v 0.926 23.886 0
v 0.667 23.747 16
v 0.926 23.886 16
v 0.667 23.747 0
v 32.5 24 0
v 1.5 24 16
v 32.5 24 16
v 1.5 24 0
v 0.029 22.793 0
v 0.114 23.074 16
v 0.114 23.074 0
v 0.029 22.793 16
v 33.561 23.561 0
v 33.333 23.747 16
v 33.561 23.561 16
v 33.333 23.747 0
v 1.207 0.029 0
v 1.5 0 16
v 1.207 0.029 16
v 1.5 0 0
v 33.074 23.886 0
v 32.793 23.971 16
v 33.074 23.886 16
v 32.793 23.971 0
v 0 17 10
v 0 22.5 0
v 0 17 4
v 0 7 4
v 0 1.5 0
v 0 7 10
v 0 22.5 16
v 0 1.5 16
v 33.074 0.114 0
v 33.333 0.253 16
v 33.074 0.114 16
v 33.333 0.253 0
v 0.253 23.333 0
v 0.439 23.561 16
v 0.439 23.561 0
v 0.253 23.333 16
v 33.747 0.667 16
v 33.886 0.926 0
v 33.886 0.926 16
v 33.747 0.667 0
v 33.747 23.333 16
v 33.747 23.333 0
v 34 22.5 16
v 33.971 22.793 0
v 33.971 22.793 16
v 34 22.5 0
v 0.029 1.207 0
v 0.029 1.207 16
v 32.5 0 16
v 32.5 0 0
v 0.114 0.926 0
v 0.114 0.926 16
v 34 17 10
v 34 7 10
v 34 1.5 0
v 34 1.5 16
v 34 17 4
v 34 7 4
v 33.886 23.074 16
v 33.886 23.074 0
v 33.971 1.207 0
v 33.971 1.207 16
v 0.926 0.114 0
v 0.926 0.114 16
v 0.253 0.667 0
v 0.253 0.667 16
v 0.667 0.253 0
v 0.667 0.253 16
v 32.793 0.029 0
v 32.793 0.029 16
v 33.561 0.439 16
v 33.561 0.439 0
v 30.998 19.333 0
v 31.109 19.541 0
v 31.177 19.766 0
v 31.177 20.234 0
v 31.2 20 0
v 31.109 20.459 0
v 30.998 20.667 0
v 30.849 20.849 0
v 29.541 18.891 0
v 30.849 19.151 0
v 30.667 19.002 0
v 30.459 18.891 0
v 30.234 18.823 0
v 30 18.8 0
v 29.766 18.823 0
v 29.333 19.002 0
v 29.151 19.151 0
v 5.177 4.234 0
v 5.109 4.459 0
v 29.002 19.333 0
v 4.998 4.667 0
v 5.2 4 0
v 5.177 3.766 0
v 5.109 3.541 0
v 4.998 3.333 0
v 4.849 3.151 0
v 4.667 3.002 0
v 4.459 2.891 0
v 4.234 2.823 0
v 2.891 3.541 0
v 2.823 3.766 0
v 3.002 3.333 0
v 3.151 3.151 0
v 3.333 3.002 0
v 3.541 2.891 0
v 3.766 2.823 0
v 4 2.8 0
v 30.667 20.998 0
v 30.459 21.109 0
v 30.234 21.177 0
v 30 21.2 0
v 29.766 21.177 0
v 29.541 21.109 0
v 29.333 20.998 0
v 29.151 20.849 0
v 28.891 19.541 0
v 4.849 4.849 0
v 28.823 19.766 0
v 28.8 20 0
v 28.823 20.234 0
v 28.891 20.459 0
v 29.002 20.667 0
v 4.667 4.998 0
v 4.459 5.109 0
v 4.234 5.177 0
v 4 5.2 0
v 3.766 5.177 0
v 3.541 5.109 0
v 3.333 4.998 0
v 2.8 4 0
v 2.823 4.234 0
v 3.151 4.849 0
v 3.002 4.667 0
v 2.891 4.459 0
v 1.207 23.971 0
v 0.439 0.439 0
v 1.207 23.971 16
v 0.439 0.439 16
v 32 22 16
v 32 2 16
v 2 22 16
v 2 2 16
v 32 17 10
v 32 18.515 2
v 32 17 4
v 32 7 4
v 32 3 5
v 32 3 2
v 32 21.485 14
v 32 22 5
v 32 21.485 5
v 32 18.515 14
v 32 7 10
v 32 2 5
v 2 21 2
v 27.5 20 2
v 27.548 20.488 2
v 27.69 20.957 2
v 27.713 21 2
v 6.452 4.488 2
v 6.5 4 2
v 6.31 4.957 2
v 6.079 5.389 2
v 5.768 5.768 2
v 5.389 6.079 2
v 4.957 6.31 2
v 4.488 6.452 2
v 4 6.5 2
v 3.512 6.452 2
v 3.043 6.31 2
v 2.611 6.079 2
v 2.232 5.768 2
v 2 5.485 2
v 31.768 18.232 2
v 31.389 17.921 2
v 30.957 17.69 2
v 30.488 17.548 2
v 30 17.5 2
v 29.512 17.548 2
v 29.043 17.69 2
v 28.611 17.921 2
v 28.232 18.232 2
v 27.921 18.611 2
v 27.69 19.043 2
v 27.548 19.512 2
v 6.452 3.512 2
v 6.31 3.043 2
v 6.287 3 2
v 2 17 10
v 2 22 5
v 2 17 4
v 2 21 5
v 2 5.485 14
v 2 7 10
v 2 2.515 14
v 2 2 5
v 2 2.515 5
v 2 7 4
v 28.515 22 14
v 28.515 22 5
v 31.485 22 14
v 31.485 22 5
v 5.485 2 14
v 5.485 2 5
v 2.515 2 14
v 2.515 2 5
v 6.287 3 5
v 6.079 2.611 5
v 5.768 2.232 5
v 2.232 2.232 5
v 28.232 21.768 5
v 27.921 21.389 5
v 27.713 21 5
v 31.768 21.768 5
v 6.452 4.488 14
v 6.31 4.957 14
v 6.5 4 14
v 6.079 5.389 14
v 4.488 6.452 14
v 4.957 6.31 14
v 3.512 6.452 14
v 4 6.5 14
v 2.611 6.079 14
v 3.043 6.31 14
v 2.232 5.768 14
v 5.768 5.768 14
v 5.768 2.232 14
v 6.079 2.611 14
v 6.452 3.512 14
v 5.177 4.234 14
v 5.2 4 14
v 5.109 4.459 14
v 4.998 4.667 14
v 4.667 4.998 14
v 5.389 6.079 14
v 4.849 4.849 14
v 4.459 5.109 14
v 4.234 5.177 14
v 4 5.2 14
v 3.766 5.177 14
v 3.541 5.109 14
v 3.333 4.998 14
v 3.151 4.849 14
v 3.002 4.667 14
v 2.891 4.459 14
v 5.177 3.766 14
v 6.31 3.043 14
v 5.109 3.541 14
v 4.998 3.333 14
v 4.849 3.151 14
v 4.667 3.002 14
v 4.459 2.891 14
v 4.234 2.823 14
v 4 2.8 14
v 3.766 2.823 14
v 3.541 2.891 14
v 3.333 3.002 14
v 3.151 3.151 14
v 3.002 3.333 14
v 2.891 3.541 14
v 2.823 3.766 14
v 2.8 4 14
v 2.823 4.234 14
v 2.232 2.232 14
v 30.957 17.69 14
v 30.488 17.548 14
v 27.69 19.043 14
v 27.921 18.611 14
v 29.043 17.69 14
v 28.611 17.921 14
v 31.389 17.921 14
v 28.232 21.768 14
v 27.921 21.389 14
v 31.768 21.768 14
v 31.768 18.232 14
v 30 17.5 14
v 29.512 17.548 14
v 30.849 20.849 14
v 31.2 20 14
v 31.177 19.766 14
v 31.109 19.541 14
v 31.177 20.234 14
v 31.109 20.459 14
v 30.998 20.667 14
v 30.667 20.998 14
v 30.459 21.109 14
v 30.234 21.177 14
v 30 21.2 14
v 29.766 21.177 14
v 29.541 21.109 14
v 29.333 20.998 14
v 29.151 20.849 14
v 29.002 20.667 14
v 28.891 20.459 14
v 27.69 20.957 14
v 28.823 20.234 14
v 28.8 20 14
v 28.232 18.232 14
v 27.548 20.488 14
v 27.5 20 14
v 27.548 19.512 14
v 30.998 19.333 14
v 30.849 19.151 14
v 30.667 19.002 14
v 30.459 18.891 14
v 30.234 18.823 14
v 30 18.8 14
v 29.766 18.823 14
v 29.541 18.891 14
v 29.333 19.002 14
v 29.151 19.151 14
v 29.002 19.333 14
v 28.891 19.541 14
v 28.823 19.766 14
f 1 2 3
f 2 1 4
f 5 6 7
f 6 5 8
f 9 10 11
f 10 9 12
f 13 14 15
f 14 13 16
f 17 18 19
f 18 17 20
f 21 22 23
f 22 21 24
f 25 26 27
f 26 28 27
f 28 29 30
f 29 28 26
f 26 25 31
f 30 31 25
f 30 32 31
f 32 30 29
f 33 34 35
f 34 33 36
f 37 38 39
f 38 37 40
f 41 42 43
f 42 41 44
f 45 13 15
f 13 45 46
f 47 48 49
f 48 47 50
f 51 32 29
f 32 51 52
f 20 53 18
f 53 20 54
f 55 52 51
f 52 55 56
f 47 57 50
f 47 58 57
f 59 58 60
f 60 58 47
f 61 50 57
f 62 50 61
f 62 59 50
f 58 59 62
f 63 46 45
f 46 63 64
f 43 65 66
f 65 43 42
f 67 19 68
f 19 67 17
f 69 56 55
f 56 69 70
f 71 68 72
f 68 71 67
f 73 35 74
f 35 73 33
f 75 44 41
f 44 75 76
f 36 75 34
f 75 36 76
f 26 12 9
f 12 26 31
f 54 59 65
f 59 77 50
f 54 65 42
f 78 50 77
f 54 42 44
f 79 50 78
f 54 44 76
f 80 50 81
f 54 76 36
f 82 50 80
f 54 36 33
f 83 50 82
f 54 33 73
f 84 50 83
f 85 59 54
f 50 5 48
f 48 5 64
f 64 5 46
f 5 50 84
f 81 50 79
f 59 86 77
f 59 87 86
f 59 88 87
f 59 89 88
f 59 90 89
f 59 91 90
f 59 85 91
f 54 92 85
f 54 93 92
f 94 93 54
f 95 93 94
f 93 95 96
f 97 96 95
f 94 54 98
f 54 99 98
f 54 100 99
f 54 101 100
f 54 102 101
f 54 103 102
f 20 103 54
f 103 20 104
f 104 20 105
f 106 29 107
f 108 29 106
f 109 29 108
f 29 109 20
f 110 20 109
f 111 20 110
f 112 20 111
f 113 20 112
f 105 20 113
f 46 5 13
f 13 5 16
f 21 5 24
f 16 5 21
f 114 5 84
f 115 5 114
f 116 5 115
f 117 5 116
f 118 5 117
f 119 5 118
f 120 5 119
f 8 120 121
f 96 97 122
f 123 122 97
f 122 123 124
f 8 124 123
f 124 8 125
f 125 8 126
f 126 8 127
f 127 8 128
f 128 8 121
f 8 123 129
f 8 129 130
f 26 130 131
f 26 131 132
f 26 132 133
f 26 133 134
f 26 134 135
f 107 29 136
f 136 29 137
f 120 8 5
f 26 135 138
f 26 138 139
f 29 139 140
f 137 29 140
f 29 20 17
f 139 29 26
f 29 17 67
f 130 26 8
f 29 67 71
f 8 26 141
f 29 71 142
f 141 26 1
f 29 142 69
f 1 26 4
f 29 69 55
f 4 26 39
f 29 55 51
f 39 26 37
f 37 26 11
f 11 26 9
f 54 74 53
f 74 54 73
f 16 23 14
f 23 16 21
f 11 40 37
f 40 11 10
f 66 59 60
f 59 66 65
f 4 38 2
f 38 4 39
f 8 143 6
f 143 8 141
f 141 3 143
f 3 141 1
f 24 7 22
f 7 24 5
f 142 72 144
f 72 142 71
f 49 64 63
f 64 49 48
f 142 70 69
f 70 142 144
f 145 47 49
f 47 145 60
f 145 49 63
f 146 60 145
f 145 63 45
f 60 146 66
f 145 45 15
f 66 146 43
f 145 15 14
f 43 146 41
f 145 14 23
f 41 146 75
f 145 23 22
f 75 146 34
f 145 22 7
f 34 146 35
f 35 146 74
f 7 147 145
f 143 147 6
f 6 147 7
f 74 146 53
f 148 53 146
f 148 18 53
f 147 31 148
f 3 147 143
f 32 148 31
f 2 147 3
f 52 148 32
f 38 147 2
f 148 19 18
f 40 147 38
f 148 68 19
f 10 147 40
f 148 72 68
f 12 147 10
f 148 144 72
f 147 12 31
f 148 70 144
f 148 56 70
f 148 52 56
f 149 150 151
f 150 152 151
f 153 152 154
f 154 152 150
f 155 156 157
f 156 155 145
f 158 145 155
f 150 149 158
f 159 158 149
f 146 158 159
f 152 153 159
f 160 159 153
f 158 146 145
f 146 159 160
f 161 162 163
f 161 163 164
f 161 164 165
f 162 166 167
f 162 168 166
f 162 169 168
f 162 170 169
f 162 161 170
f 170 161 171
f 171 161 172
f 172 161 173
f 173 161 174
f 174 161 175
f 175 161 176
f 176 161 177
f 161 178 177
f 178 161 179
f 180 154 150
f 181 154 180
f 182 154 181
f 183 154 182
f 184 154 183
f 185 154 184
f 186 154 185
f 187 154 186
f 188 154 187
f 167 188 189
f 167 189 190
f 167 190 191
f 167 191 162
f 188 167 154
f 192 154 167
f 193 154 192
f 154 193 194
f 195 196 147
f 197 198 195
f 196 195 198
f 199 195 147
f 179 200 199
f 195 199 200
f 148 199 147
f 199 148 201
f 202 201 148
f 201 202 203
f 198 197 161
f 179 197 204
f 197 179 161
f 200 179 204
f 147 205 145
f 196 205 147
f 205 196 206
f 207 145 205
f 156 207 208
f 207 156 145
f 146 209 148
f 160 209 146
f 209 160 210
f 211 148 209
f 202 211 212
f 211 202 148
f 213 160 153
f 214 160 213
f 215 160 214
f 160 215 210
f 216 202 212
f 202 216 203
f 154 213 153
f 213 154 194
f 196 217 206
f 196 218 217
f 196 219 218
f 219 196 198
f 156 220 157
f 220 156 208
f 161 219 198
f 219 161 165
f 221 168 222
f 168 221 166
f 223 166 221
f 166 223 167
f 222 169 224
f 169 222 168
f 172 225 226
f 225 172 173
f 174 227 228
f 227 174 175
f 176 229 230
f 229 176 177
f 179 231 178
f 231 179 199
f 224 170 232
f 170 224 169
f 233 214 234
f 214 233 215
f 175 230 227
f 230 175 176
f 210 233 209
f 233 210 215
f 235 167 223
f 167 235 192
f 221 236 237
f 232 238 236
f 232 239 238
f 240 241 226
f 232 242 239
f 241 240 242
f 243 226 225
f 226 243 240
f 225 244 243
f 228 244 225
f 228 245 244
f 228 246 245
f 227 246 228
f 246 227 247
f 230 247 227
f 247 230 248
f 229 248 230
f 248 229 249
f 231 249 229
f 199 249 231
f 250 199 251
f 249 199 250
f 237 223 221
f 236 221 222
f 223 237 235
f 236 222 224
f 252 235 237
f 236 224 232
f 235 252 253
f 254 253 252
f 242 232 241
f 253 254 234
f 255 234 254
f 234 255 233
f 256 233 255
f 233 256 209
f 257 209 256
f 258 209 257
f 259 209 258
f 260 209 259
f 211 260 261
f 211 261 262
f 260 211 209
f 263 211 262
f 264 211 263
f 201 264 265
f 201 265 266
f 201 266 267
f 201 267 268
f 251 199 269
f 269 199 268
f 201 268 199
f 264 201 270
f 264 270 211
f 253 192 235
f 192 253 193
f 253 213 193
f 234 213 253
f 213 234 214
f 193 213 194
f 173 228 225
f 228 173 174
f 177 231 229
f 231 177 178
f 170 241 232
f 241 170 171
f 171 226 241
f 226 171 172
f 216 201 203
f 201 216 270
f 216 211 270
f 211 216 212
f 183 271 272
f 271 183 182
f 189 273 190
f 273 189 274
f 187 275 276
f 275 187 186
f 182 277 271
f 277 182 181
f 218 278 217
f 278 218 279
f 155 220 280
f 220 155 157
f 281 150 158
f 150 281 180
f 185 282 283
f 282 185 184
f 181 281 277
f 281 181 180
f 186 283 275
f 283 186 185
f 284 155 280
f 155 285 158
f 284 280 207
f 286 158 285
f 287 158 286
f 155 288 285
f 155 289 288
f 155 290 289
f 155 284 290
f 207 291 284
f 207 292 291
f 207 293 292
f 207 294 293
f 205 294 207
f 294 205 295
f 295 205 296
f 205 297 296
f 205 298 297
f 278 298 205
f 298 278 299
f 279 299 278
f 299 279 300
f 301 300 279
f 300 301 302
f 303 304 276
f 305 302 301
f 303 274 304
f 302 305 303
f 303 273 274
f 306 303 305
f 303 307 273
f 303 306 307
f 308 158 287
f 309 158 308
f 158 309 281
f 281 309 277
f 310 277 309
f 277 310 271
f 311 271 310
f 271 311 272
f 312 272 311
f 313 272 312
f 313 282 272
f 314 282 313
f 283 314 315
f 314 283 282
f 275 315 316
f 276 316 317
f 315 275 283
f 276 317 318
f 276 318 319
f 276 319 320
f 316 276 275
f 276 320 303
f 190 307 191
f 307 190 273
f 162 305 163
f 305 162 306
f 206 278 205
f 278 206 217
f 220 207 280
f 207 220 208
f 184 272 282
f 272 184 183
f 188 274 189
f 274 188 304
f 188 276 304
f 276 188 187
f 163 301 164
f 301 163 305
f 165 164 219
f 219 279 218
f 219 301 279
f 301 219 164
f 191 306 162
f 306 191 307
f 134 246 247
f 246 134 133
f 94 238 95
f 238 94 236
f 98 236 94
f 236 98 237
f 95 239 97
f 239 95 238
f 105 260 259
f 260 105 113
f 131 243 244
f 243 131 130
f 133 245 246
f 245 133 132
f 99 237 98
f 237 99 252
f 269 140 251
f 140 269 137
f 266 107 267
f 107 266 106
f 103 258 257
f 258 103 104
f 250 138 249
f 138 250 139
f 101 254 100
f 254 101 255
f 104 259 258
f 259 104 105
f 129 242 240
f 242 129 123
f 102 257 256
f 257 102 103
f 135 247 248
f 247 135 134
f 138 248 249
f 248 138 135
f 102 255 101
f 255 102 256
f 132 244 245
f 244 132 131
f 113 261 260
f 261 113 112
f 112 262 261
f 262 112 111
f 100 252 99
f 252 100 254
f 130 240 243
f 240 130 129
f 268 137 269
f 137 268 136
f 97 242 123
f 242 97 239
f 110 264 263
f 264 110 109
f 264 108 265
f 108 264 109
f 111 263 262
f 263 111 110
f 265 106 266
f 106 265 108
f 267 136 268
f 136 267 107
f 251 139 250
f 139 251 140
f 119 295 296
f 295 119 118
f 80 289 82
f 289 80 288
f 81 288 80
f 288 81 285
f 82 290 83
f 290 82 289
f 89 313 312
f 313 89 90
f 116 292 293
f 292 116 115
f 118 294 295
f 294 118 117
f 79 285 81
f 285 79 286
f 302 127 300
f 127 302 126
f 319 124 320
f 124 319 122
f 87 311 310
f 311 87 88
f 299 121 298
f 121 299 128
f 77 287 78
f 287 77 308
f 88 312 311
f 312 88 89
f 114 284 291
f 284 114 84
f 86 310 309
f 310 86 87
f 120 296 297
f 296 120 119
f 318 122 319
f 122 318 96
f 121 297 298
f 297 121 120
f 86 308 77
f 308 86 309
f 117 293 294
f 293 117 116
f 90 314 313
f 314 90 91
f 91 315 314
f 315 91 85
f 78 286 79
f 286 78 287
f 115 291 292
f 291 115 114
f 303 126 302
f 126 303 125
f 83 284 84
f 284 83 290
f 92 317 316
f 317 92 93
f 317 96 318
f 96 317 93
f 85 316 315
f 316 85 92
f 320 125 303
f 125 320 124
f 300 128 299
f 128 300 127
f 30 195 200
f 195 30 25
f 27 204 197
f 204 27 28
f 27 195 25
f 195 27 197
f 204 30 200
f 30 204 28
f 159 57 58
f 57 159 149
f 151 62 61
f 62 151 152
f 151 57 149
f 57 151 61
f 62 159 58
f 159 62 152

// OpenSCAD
// file: rail_spec.scad
// ===== 레일 플랫폼 방식 공용 파라미터 =====
// 핵심 개념: 침대를 들지 않고 굴려서 올라가는 2개의 계량 레일.
//   각 레일 = 알루미늄 프로파일 빔 + 양 끝단 아래 로드셀 2개
//   침대 좌/우 바퀴가 각각 레일 위를 굴러 들어가 크래들에 안착.
//   총 로드셀 4개 = 좌레일 앞/뒤 + 우레일 앞/뒤
//   총중량 = 4개 합 / 무게중심 = 모멘트 계산

// --- 로드셀 CAS BCA-100L ---
L_len=150; L_wid=35; L_thk=40;
L_pitch_x=19; L_pitch_y=15;
L_free_x1=16.5; L_free_x2=35.5;   // 자유단(상면 탭)
L_fix_x1=114.5; L_fix_x2=133.5;   // 고정단(하면 탭)

// --- 스택 높이 ---
PAD_thk    = 6;    // 바닥 패드 두께
FOOT_h     = 2.5;  // 패드 하면 지지 발 높이 (전면접촉 대신 4점 지지)
FOOT_d     = 12;   // 지지 발 지름
SPACER_h   = 5;    // 로드셀 고정단 단상
// --- 어댑터 플레이트(구 bracket) : 로드셀 자유단 상면 <-> 레일 연결 ---
// PDF 부품목록 확정치 80x80x12. 로드셀 40mm 대응 + 자유단 체결홀이 바퀴
// 슬롯을 관통하지 않도록 레일 체결점을 수평 이격시키는 오프셋 캔틸레버.
ADP_l      = 80;   // 어댑터 길이(로드셀 길이방향, 오프셋이 생기는 축)
ADP_w      = 80;   // 어댑터 폭
ADP_t      = 12;   // 어댑터 두께(=구 BRACKET_t 대체). 12mm라 굽힘강성 충분
ADP_OFFSET = 30;   // ★임의값★ 자유단 홀 중심 ↔ 레일 체결부 중심 오프셋(mm)
                   //   실측 확정 필요(MEASUREMENTS_TODO C1/C2). 슬롯 반대쪽으로.
BRACKET_t  = ADP_t;  // 스택 계산 호환용 별칭 (기존 DECK_Z 식 유지)
RAIL_h     = 30;   // 알루미늄 프로파일 높이 (30x60 사용)
RAIL_w     = 60;   // 프로파일 폭 (바퀴 두께 22mm + 여유)
DECK_Z = PAD_thk + SPACER_h + L_thk + BRACKET_t + RAIL_h;   // 6+5+40+12+30 = 93
// (원 설계 87: 브래킷6. 개선으로 어댑터 12mm 도입 -> 93. 램프 길이 자동 연동)
// 주: 패드 하면 지지 발(FOOT_h) 때문에 4개 채널 모두 절대 높이가 FOOT_h 만큼
//     동일하게 올라간다. 로드셀 상호 수평/정합은 유지되고(전부 같이 올라감),
//     절대 데크 높이만 DECK_Z + FOOT_h 가 된다. 램프는 하중경로 분리부품이라
//     이 2.5mm 차이는 무시 가능(15° 경사에서 미소).

// --- 레일 전체 ---
CASTER_PITCH = 1700;   // 침대 앞뒤 캐스터 간격
RAMP_ANG = 15;
RAMP_len = DECK_Z / tan(RAMP_ANG);      // 약 325mm
RAIL_len = CASTER_PITCH + 400;          // 캐스터간격 + 양끝 여유

// --- 바퀴 ---
wheel_d=60; wheel_thk=22;   // 실측 후 교체
CRADLE_depth = 9;           // 얕은 크래들: 굴러 넘어갈 수 있되 안착은 되게
// main file
// ===== HX711 인클로저 (바퀴 유닛당 1개) =====
// PDF 부품목록 확정: 외형 34 x 24 x 16mm. 기판 SZH-SSBH-054 25 x 15mm.
// 로드셀 신호 in <-> ESP32(SCK 공유) out. 하중경로 아님 -> PLA 가능.
// 체결: 볼트 + 육각너트 트랩 관통.
//
// part="base" : 박스 본체(바닥 + 4벽 + 기판 지지 립)
// part="lid"  : 뚜껑
include <rail_spec.scad>
part = "base";
$fn = 32;

// --- 외형 (PDF 확정) ---
BOX_L = 34; BOX_W = 24; BOX_H = 16;
WALL  = 2;                   // 소형이라 2mm
FILLET = 1.5;

// --- HX711 기판 (확정 25x15) ---
PCB_L = 25; PCB_W = 15;
LEDGE_H = 3;                 // 기판 안착 립 높이
LEDGE_W = 1.5;               // 립 폭

// --- 뚜껑 체결 (소형 M2) ---
LID_BOLT_D = 2.4;            // M2 관통
LID_NUT_AF = 4.2;           // M2 육각너트 대변 + 여유
LID_NUT_H  = 1.8;

module rrect(l,w,h,r){ hull() for(x=[r,l-r]) for(y=[r,w-r]) translate([x,y,0]) cylinder(r=r,h=h); }

// 케이블 인출구: 짧은 변 양쪽
module cable_slots(){
    // 좌: 로드셀 신호 (Ex/Sig 4선)
    translate([-2, BOX_W/2-5, WALL+2]) cube([WALL+4, 10, 6]);
    // 우: ESP32 (VCC/GND/DT/SCK)
    translate([BOX_L-WALL-2, BOX_W/2-5, WALL+2]) cube([WALL+4, 10, 6]);
}

// 대각 두 모서리 체결(소형이라 2점이면 충분). 기둥(d=5,r=2.5)이 벽 안쪽면과
// 정확히 일치하지 않도록 WALL+2 에 배치 -> 벽 속으로 0.5 겹침(union 안전).
bp = WALL + 2;
bolt_pts = [[bp, bp], [BOX_L-bp, BOX_W-bp]];

module base(){
    echo(str("HX711 박스 base ",BOX_L,"x",BOX_W,"x",BOX_H," 벽",WALL,
             " / PCB ",PCB_L,"x",PCB_W));
    difference(){
        union(){
            // 바닥 + 4벽 (윗면 개방), 내부 캐비티는 단순 큐브
            difference(){
                rrect(BOX_L, BOX_W, BOX_H, FILLET);
                translate([WALL, WALL, WALL])
                    cube([BOX_L-2*WALL, BOX_W-2*WALL, BOX_H]);
            }
            // 기판 안착 립 (좌우 긴 변 안쪽). 벽과 0.5 겹치게 해 면 일치(non-manifold) 회피.
            for(sy=[WALL-0.5, BOX_W-WALL-LEDGE_W+0.5])
                translate([WALL-0.5, sy, WALL]) cube([BOX_L-2*WALL+1, LEDGE_W, LEDGE_H]);
            // 뚜껑 체결 기둥 (바닥부터, 벽과 겹침)
            for(p=bolt_pts)
                translate([p[0],p[1],0]) cylinder(d=5, h=BOX_H-2);
        }
        // 뚜껑 볼트 관통 (바닥~기둥 상단 관통)
        for(p=bolt_pts)
            translate([p[0],p[1],-1]) cylinder(d=LID_BOLT_D, h=BOX_H+2);
        cable_slots();
    }
}

module lid(){
    echo(str("HX711 박스 lid ",BOX_L,"x",BOX_W));
    difference(){
        rrect(BOX_L, BOX_W, WALL, FILLET);
        for(p=bolt_pts){
            translate([p[0],p[1],-1]) cylinder(d=LID_BOLT_D, h=WALL+2);
            translate([p[0],p[1],WALL-LID_NUT_H])
                cylinder(d=LID_NUT_AF/cos(30), h=LID_NUT_H+0.1, $fn=6);
        }
    }
}

// rail_system.scad 조립 뷰 호환 별칭 (박스 본체 형상)
module hx711_body(){ base(); }

if(part=="base") base(); else lid();
